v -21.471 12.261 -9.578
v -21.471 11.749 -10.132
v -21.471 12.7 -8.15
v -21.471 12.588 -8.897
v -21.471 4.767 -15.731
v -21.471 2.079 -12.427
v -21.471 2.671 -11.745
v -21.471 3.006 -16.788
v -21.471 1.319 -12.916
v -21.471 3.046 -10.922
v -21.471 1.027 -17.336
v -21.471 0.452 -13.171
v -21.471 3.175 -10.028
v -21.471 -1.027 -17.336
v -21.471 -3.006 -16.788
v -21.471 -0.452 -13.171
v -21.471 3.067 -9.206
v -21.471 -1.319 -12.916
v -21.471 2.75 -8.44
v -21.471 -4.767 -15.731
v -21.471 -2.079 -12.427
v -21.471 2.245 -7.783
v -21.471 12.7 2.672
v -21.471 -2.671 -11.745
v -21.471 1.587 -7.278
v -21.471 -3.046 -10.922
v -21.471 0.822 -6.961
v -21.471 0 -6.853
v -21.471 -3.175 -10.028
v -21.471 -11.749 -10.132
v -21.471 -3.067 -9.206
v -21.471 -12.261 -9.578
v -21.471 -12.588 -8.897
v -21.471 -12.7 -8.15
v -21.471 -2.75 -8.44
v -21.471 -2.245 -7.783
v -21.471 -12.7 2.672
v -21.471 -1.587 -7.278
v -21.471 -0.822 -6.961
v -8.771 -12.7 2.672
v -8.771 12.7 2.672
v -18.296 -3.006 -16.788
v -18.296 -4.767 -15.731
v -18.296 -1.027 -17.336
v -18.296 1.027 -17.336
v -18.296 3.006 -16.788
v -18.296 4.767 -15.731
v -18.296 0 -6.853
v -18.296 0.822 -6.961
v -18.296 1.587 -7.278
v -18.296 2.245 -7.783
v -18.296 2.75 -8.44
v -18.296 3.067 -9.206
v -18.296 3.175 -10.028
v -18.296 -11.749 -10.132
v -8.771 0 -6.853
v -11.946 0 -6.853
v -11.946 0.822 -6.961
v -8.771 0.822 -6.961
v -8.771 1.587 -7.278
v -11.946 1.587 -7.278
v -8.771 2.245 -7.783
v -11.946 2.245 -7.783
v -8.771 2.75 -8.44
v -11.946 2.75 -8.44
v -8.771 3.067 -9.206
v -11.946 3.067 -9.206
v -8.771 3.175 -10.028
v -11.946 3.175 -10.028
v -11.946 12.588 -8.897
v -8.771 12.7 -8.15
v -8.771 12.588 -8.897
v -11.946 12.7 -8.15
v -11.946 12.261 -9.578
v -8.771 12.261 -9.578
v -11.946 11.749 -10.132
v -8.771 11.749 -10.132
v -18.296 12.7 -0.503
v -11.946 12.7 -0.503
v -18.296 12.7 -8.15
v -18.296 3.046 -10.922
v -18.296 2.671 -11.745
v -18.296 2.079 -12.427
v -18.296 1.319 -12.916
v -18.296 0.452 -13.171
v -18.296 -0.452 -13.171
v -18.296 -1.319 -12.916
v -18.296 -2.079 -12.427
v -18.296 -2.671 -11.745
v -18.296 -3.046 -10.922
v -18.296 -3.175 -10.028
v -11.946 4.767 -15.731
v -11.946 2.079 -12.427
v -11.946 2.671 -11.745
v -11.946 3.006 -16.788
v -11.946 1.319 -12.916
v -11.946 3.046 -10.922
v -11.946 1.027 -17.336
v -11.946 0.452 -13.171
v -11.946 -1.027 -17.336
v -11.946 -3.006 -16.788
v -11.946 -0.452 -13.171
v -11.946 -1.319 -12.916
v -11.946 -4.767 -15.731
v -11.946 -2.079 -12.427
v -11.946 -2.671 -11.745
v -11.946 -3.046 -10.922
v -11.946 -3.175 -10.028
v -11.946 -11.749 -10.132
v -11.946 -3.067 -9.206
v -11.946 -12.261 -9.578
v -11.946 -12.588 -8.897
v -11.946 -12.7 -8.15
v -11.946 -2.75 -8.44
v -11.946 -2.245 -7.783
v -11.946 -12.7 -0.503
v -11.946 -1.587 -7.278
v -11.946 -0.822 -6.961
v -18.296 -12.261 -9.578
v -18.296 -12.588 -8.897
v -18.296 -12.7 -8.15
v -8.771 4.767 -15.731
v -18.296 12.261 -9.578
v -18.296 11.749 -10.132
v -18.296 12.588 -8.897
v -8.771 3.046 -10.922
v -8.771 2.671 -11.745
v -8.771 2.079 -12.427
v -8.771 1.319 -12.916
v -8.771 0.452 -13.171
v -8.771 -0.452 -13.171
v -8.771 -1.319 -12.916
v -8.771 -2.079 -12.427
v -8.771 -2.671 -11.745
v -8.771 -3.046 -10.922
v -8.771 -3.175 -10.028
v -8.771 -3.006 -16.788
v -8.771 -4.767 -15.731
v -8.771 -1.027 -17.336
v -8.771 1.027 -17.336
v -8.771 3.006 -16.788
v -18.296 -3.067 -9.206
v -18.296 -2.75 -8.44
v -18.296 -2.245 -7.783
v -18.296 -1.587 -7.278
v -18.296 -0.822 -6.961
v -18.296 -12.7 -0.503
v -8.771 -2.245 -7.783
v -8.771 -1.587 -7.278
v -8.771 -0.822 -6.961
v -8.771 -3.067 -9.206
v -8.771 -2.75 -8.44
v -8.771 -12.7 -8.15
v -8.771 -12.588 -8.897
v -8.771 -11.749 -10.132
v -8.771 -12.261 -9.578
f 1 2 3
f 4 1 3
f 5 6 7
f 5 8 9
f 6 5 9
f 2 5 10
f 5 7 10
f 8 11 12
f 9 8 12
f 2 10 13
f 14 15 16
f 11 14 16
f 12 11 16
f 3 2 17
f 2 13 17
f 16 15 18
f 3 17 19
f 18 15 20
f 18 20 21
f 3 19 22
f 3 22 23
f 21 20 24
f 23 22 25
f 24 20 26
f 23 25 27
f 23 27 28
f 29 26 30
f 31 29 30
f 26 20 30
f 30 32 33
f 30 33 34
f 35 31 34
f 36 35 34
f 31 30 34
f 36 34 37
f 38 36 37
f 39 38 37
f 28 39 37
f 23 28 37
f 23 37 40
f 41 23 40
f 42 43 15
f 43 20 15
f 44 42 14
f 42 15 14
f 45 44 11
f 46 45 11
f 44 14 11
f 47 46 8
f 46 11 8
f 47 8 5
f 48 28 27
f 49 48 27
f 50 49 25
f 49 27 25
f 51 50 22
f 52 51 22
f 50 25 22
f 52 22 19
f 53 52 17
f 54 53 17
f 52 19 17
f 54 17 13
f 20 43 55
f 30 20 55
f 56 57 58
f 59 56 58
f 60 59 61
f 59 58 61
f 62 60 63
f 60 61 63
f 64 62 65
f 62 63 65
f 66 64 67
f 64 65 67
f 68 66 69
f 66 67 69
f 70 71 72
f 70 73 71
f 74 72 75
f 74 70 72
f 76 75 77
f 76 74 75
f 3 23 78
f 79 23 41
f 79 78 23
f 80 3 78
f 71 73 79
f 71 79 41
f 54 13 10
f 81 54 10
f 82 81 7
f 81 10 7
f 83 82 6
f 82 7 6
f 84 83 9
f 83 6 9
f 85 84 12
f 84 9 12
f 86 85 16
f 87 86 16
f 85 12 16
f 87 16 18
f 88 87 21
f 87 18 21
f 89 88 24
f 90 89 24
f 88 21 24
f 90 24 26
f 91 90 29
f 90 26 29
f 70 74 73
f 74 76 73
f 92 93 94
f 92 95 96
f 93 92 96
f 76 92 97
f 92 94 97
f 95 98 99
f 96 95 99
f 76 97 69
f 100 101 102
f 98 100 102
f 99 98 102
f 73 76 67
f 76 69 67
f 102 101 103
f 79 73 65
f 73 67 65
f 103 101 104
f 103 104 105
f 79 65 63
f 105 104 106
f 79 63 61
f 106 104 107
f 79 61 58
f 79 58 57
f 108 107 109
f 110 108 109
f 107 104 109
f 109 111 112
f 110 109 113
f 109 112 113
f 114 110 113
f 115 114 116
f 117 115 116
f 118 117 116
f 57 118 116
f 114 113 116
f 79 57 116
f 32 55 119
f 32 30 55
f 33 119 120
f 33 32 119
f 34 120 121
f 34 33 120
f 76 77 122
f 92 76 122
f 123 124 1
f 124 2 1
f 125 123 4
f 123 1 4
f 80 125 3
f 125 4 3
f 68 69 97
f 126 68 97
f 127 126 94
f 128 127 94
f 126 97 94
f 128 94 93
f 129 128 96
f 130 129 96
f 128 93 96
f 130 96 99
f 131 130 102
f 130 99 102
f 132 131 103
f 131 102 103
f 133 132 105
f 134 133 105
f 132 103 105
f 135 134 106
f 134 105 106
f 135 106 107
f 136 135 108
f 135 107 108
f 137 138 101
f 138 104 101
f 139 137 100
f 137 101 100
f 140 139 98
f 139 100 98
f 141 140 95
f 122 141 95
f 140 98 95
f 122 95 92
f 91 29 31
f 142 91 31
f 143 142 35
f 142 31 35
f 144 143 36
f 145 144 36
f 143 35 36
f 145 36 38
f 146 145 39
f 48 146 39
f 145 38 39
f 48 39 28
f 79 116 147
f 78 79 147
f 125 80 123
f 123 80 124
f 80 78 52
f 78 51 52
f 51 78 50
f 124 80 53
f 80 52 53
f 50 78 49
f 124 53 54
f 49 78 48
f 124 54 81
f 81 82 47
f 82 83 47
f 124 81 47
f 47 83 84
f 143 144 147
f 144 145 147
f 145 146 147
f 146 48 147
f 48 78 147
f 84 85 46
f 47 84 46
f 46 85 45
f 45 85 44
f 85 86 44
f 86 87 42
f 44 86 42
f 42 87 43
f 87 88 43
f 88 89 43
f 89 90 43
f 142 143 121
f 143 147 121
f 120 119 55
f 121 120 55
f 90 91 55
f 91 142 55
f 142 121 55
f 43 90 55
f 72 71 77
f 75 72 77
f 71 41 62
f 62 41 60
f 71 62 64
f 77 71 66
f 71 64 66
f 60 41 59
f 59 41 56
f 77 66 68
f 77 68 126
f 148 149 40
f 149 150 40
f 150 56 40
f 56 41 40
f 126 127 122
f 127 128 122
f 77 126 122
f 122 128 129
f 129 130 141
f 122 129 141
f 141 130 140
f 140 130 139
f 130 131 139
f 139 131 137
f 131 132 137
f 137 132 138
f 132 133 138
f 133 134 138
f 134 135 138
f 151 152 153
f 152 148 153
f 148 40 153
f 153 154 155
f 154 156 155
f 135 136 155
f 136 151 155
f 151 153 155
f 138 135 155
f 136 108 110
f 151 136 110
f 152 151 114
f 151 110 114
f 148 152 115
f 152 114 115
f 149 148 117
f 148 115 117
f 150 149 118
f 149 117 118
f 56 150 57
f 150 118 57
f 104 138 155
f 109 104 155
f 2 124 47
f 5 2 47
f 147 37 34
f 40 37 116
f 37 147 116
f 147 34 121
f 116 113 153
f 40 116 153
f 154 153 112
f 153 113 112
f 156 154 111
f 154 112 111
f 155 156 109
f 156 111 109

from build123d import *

# Parameters (mm, degrees)
BOSS_EXTRUDE1_DEPTH      = 12.7
BOSS_EXTRUDE1_DEPTH_BACK = 12.7
SKETCH3_R                = 3.175
CUT_EXTRUDE1_DEPTH       = 27.549927447
CUT_EXTRUDE3_DEPTH       = 17.78
FILLET1_R                = 7.62
FILLET2_R                = 2.54


with BuildPart() as part:
    # Sketch1 → Boss-Extrude1 (new, two sides: drawn at the far end of the back side and taken through both)
    with BuildSketch(Plane(origin=(0, 0, 0), x_dir=(1, 0, 0), z_dir=(0, 1, 0)).offset(-BOSS_EXTRUDE1_DEPTH_BACK)):
        Polygon((-21.470544554, -2.672029703), (-8.770544554, -2.672029703), (-8.770544554, 19.552970297), (-11.945544554, 19.552970297), (-11.945544554, 0.502970297), (-18.295544554, 0.502970297), (-18.295544554, 19.552970297), (-21.470544554, 19.552970297), align=None)
    extrude(amount=BOSS_EXTRUDE1_DEPTH + BOSS_EXTRUDE1_DEPTH_BACK)

    # Sketch3 → Cut-Extrude1 (cut, through all)
    with BuildSketch(Plane.ZY.offset(21.470544554)):
        with Locations((-10.027970297, 0)):
            Circle(SKETCH3_R)
    extrude(amount=-CUT_EXTRUDE1_DEPTH, mode=Mode.SUBTRACT)

    # Sketch5 → Cut-Extrude3 (cut)
    with BuildSketch(Plane(origin=(-8.770544554, 0, 0), x_dir=(0, 0, -1), z_dir=(1, 0, 0))):
        Polygon((19.552970297, 12.7), (9.369494421, 12.7), (19.552970297, 0), align=None)
        Polygon((19.552970297, -12.7), (19.552970297, 0), (9.369494421, -12.7), align=None)
    extrude(amount=-CUT_EXTRUDE3_DEPTH, mode=Mode.SUBTRACT)

    # Fillet1
    fillet1_edges = [part.edges().sort_by_distance(p)[0] for p in [
        (-19.883044554, 0, -19.552970297),
        (-10.358044554, 0, -19.552970297),
    ]]
    fillet(fillet1_edges, radius=FILLET1_R)

    # Fillet2
    fillet2_edges = [part.edges().sort_by_distance(p)[0] for p in [
        (-19.883044554, -12.7, -9.369494421),
        (-10.358044554, -12.7, -9.369494421),
        (-10.358044554, 12.7, -9.369494421),
        (-19.883044554, 12.7, -9.369494421),
    ]]
    fillet(fillet2_edges, radius=FILLET2_R)


solid = part.part
